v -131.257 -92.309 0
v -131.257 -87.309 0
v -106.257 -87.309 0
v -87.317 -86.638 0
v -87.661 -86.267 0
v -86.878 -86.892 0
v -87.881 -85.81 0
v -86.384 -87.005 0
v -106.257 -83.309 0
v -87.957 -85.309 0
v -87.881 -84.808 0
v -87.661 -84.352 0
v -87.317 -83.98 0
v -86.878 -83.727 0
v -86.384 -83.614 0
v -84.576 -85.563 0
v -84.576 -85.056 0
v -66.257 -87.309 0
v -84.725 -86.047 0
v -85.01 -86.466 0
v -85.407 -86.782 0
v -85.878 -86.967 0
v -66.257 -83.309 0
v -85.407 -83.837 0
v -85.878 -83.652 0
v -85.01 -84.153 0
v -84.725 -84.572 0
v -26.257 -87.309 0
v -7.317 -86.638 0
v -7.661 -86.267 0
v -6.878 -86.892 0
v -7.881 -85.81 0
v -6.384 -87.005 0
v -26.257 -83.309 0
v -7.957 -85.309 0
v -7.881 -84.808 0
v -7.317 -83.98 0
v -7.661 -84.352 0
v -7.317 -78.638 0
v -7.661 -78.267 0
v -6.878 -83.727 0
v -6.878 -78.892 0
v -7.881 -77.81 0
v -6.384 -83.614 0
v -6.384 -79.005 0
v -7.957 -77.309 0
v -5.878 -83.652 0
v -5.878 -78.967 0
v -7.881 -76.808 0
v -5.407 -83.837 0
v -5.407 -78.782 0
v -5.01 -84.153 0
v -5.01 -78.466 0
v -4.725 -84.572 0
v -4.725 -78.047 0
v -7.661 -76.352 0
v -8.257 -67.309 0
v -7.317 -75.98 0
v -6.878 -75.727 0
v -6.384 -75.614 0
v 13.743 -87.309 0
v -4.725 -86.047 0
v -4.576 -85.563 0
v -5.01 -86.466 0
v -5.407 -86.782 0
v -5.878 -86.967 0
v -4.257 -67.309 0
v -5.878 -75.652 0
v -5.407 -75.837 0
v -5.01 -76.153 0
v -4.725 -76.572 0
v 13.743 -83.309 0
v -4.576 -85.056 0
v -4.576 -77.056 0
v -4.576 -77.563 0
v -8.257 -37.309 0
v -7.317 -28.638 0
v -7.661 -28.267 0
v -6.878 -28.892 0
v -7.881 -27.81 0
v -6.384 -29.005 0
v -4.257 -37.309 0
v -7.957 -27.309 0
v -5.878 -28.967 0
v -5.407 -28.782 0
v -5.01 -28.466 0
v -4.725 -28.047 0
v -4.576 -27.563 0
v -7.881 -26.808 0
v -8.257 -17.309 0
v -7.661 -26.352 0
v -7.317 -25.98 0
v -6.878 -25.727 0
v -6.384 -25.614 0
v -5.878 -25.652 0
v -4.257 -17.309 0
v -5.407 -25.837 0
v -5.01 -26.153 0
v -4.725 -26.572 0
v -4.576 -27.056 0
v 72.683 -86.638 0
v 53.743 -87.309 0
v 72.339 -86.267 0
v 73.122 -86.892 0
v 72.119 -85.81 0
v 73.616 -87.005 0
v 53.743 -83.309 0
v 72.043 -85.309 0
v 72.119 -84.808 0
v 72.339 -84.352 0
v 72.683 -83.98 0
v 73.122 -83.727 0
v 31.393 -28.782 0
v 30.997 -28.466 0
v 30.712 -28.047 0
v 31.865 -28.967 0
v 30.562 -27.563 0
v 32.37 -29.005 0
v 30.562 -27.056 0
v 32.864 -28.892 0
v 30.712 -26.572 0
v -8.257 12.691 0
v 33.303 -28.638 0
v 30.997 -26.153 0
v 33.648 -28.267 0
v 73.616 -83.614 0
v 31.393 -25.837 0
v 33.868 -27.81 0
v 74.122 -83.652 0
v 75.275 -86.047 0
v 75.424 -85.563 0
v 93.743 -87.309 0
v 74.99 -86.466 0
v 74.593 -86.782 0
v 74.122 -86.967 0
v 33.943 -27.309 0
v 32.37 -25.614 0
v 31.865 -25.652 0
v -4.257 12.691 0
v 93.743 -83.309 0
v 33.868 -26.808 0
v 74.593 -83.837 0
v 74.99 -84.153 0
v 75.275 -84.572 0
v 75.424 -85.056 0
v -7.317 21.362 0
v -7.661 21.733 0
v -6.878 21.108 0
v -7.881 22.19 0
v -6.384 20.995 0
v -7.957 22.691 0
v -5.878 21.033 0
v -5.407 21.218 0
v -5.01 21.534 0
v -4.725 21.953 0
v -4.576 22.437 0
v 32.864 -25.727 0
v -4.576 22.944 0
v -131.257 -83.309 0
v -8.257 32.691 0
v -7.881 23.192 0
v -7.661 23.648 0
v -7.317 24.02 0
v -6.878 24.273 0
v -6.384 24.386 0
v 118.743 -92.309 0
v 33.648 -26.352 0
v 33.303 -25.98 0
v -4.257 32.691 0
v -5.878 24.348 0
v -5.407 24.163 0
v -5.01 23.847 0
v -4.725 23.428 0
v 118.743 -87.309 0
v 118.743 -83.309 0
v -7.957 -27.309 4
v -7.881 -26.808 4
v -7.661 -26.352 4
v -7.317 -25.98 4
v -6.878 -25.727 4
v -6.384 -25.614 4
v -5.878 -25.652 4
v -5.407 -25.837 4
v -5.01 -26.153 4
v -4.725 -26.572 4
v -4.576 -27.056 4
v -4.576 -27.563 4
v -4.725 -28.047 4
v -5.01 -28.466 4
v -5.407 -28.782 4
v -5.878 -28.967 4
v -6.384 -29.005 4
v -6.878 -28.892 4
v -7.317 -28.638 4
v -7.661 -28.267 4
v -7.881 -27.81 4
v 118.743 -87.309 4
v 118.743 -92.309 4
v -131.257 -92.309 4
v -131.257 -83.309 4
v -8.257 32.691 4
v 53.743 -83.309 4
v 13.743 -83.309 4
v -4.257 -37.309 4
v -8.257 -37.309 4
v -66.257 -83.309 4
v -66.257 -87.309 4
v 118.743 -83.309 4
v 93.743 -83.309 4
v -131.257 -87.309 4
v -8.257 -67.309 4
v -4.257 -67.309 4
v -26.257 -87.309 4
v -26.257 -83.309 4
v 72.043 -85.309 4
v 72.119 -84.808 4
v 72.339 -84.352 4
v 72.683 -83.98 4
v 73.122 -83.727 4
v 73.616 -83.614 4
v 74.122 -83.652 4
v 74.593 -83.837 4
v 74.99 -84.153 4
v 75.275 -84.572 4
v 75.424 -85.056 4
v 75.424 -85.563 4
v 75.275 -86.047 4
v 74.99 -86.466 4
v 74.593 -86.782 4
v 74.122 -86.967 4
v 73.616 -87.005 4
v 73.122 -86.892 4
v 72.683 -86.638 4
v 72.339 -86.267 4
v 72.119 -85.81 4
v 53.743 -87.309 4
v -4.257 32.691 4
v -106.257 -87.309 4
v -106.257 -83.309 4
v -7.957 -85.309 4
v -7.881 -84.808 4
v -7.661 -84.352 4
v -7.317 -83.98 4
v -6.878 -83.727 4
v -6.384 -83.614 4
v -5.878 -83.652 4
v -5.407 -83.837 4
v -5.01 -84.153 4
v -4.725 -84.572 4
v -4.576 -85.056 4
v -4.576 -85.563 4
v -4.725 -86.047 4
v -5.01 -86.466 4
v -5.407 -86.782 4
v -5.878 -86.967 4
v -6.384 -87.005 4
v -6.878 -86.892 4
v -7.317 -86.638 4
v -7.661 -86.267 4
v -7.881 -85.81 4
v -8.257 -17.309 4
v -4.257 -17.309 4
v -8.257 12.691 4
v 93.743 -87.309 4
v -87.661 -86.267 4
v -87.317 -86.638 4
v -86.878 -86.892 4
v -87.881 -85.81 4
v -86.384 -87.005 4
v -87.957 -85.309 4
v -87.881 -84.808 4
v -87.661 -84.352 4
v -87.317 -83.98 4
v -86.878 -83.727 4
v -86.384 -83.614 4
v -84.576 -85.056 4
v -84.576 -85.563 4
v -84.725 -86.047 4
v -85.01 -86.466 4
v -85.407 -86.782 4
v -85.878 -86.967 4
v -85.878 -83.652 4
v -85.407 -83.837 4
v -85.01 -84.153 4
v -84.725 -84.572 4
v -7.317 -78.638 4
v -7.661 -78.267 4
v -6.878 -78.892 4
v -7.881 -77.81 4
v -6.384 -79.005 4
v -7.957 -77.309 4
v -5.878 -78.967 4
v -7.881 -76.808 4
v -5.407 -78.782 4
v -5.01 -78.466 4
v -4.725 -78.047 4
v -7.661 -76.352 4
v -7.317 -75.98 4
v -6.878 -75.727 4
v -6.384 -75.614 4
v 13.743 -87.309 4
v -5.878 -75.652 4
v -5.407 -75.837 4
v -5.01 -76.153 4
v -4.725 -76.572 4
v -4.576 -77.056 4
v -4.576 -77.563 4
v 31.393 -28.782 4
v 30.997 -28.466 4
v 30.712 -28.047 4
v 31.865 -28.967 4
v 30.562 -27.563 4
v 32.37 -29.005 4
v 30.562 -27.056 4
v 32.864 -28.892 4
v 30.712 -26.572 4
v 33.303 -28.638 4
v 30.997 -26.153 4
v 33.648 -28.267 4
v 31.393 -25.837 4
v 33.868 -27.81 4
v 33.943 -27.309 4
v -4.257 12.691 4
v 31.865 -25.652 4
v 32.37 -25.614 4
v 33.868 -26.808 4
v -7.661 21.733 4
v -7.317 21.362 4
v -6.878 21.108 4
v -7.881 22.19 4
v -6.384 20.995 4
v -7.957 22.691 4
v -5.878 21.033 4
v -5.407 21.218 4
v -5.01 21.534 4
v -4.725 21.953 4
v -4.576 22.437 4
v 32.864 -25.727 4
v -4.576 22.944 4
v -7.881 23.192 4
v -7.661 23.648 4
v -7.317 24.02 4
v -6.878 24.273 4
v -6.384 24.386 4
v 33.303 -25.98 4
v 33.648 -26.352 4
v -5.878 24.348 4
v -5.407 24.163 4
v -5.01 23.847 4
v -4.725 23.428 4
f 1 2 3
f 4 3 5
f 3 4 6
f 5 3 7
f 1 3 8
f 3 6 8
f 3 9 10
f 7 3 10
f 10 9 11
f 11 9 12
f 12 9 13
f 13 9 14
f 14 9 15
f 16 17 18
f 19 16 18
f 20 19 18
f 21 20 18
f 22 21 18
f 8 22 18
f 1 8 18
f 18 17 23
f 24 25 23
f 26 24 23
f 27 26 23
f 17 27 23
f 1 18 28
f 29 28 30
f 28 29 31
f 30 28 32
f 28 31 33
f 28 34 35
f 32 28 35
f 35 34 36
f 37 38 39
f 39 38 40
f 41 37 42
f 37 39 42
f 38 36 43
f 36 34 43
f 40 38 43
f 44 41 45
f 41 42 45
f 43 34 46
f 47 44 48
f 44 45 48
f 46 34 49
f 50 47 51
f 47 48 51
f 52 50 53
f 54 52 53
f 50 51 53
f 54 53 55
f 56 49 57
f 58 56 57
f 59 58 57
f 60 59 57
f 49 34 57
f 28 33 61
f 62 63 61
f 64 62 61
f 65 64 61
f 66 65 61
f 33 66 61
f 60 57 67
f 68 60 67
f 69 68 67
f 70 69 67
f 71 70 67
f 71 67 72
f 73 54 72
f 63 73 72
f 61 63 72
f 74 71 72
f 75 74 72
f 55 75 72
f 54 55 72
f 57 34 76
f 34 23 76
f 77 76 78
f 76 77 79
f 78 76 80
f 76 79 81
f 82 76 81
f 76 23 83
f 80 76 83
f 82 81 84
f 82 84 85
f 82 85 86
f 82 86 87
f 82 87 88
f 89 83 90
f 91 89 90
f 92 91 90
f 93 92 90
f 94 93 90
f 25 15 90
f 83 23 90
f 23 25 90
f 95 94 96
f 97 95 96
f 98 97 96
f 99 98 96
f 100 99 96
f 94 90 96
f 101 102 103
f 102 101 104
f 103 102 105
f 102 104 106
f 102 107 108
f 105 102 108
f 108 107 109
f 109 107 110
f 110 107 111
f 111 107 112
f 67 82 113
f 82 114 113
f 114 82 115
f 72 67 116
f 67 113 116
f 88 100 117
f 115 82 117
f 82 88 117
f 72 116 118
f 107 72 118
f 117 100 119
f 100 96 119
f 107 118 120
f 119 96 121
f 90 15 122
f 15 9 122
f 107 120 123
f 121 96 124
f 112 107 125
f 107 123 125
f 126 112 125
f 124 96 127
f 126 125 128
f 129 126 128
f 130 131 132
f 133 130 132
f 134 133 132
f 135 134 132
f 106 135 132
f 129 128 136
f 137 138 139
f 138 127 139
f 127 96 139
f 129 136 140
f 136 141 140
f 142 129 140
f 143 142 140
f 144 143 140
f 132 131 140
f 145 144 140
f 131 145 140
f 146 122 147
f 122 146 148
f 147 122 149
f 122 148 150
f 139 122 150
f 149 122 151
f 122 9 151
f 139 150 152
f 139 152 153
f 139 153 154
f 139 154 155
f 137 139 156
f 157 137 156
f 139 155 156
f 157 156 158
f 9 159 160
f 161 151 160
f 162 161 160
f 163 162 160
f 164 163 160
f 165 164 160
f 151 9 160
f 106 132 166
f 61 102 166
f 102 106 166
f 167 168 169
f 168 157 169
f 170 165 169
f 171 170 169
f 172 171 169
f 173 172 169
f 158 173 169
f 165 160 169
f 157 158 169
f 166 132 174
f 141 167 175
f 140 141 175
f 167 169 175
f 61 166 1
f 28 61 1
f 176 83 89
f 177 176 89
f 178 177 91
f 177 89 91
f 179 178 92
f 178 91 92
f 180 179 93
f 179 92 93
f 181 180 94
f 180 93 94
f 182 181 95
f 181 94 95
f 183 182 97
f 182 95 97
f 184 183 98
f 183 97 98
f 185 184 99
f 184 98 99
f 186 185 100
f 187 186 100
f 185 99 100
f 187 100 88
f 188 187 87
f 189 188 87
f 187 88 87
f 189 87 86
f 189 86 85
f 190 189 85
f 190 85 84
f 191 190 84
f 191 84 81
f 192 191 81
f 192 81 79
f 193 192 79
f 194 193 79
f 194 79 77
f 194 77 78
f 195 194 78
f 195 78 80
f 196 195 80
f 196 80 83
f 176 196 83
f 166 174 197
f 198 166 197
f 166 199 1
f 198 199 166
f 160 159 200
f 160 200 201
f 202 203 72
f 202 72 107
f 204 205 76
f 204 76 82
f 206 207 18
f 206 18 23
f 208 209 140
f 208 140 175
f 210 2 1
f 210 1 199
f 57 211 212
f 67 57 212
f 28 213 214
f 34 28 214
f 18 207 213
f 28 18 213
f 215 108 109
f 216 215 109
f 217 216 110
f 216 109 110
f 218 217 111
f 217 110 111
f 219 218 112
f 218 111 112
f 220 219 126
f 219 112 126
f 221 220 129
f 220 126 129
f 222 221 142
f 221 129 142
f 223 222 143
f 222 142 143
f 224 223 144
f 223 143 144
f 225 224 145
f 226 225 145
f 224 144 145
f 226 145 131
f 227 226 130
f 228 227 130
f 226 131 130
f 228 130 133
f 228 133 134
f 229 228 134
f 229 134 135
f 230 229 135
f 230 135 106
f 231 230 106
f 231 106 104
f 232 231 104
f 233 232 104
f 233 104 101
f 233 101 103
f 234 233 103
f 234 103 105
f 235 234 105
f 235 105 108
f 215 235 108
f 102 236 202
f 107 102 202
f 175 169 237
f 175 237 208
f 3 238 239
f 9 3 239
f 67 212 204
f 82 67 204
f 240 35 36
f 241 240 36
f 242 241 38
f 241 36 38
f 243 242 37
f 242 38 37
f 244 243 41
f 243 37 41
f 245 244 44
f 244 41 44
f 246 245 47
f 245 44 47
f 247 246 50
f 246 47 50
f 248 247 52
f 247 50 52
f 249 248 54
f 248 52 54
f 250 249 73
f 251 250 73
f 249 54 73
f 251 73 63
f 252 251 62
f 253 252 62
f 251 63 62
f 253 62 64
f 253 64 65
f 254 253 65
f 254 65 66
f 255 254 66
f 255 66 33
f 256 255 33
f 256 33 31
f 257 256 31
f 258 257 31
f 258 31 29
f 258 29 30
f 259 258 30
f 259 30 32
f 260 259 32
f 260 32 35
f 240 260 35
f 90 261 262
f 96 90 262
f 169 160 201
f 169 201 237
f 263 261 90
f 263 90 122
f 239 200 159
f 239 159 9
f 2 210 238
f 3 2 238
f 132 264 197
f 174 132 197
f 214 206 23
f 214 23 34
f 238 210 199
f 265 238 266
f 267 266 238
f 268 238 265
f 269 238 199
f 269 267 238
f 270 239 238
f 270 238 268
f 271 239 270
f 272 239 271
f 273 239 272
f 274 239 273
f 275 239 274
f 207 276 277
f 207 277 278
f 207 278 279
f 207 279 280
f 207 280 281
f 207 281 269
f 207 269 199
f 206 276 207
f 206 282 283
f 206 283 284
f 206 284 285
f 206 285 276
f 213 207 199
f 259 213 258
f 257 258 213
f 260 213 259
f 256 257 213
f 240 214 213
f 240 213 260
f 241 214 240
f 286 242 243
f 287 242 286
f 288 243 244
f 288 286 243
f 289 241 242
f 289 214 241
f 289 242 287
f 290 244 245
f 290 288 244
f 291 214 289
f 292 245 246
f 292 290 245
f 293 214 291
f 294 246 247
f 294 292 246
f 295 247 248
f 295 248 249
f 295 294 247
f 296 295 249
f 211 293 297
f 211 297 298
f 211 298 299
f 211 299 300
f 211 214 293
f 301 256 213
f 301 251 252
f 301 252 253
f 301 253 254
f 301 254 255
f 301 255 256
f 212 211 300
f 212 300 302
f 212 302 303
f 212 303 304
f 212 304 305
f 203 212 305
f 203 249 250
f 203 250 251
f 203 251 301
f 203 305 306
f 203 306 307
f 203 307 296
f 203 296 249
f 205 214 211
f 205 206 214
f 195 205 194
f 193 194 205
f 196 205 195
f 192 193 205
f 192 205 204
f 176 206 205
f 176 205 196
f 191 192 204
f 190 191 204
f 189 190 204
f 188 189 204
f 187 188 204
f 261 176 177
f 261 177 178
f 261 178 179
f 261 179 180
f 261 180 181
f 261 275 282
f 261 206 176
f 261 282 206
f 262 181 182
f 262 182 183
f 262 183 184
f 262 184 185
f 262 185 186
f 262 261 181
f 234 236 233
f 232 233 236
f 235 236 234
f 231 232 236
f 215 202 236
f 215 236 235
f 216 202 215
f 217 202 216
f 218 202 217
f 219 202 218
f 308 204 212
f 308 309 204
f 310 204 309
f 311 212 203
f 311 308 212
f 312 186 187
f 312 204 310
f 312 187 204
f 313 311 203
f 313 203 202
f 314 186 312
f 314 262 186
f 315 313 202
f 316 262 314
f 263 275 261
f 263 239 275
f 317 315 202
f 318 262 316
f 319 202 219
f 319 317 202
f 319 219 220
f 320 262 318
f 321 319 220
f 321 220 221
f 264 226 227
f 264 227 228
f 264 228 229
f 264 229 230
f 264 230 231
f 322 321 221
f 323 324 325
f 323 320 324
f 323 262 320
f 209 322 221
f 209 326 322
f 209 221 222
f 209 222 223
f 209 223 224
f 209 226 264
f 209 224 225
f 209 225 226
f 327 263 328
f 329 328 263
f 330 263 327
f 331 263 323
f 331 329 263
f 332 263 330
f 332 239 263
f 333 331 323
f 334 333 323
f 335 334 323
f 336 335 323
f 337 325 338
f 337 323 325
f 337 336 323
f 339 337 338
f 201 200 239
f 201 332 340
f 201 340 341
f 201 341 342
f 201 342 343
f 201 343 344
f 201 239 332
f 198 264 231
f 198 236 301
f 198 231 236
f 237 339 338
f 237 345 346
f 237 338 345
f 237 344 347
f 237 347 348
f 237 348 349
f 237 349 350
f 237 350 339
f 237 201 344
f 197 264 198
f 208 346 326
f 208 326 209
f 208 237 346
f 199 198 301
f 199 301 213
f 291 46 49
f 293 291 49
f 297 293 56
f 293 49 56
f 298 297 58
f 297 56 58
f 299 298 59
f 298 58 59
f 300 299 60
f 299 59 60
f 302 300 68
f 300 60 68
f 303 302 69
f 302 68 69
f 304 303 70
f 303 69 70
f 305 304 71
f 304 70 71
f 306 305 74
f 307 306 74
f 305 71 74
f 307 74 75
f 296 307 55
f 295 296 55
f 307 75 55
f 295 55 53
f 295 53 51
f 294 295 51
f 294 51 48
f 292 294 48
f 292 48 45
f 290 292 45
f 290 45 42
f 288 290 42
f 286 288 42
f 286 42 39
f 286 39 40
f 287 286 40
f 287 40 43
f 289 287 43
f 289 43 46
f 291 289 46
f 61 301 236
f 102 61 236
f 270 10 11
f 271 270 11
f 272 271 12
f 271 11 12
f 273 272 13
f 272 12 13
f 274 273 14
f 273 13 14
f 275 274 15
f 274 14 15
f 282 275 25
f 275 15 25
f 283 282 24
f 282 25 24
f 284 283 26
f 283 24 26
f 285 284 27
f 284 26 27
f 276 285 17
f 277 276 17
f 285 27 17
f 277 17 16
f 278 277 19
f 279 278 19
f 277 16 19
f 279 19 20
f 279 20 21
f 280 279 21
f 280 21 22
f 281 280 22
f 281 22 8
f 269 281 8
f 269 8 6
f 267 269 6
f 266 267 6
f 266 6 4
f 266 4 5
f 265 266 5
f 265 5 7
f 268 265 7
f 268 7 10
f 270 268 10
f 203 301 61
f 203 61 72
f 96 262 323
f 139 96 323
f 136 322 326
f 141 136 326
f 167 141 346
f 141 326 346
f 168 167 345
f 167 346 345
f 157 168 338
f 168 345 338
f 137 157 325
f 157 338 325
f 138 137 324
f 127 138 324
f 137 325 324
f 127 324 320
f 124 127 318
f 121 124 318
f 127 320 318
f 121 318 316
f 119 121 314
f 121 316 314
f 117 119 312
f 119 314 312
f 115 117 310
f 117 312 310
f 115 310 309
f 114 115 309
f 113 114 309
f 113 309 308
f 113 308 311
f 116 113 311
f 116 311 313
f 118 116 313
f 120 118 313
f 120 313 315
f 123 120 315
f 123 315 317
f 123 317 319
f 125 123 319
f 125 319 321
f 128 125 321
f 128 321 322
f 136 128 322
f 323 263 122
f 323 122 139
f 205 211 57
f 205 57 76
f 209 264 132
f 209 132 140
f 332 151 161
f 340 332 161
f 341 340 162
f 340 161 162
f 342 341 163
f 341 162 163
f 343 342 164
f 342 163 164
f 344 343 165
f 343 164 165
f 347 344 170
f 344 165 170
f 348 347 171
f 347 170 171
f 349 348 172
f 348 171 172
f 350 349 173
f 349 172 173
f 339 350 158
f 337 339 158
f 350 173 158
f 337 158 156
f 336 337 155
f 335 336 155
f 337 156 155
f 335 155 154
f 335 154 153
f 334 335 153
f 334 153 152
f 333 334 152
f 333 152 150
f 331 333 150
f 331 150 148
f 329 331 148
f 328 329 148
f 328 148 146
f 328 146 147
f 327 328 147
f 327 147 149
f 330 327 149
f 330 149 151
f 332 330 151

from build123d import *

# Parameters (mm, degrees)
BOSS_EXTRU_1_DEPTH         = 4
ESQUISSE2_W                = 4
ESQUISSE2_H                = 30
ENL_V_MAT_EXTRU_1_DEPTH    = 4
R_P_TITION_LIN_AIRE1_COUNT = 2
R_P_TITION_LIN_AIRE1_PITCH = 50
ESQUISSE3_W                = 25
ESQUISSE3_H                = 4
ESQUISSE3_W_2              = 40
ENL_V_MAT_EXTRU_2_DEPTH    = 4
D_GAGEMENT_M31_D           = 3.4
ESQUISSE9_W                = 250
ESQUISSE9_H                = 4
BOSS_EXTRU_2_DEPTH         = 5
ESQUISSE10_R               = 1.7
ENL_V_MAT_EXTRU_3_DEPTH    = 10


with BuildPart() as part:
    # Esquisse1 → Boss.-Extru.1 (new body)
    with BuildSketch(Plane.XY):
        Polygon((-8.256647574, 32.690679855), (-4.256647574, 32.690679855), (118.743352426, -83.309320145), (118.743352426, -87.309320145), (-131.256647574, -87.309320145), (-131.256647574, -83.309320145), align=None)
    extrude(amount=BOSS_EXTRU_1_DEPTH)

    # Esquisse2 → Enlèv. mat.-Extru.1 (cut)
    with BuildSketch(Plane.XY.offset(4)):
        with Locations((-6.256647574, -2.309320145)):
            Rectangle(ESQUISSE2_W, ESQUISSE2_H)
    enl_v_mat_extru_1 = extrude(amount=-ENL_V_MAT_EXTRU_1_DEPTH, mode=Mode.SUBTRACT)

    # Répétition linéaire1: Enlèv. mat.-Extru.1 ×2
    with Locations(*[(0, -i * R_P_TITION_LIN_AIRE1_PITCH, 0) for i in range(1, R_P_TITION_LIN_AIRE1_COUNT)]):
        add(enl_v_mat_extru_1, mode=Mode.SUBTRACT)

    # Esquisse3 → Enlèv. mat.-Extru.2 (cut)
    with BuildSketch(Plane.XY.offset(4)):
        with Locations((-118.756647574, -85.309320145)):
            Rectangle(ESQUISSE3_W, ESQUISSE3_H)
        with Locations((33.743352426, -85.309320145)):
            Rectangle(ESQUISSE3_W_2, ESQUISSE3_H)
        with Locations((-46.256647574, -85.309320145)):
            Rectangle(ESQUISSE3_W_2, ESQUISSE3_H)
        with Locations((113.743352426, -85.309320145)):
            Rectangle(ESQUISSE3_W_2, ESQUISSE3_H)
    extrude(amount=-ENL_V_MAT_EXTRU_2_DEPTH, mode=Mode.SUBTRACT)

    # Dégagement M31 (through all)
    with Locations(Plane.XY.offset(4)):
        with Locations((-6.256647574, 22.690679855), (-6.256647574, -27.309320145), (-6.256647574, -77.309320145), (-6.256647574, -85.309320145), (-86.256647574, -85.309320145), (73.743352426, -85.309320145)):
            Hole(D_GAGEMENT_M31_D / 2)

    # Esquisse9 → Boss.-Extru.2 (add)
    with BuildSketch(Plane.XZ.offset(87.309320145)):
        with Locations((-6.256647574, 2)):
            Rectangle(ESQUISSE9_W, ESQUISSE9_H)
    extrude(amount=BOSS_EXTRU_2_DEPTH)

    # Esquisse10 → Enlèv. mat.-Extru.3 (cut)
    with BuildSketch(Plane(origin=(-276.256647574, 4.324322261, 4), x_dir=(1, 0, 0), z_dir=(0, 0, 1))):
        with Locations((308.5, -31.633642405)):
            Circle(ESQUISSE10_R)
    extrude(amount=-ENL_V_MAT_EXTRU_3_DEPTH, mode=Mode.SUBTRACT)


solid = part.part
